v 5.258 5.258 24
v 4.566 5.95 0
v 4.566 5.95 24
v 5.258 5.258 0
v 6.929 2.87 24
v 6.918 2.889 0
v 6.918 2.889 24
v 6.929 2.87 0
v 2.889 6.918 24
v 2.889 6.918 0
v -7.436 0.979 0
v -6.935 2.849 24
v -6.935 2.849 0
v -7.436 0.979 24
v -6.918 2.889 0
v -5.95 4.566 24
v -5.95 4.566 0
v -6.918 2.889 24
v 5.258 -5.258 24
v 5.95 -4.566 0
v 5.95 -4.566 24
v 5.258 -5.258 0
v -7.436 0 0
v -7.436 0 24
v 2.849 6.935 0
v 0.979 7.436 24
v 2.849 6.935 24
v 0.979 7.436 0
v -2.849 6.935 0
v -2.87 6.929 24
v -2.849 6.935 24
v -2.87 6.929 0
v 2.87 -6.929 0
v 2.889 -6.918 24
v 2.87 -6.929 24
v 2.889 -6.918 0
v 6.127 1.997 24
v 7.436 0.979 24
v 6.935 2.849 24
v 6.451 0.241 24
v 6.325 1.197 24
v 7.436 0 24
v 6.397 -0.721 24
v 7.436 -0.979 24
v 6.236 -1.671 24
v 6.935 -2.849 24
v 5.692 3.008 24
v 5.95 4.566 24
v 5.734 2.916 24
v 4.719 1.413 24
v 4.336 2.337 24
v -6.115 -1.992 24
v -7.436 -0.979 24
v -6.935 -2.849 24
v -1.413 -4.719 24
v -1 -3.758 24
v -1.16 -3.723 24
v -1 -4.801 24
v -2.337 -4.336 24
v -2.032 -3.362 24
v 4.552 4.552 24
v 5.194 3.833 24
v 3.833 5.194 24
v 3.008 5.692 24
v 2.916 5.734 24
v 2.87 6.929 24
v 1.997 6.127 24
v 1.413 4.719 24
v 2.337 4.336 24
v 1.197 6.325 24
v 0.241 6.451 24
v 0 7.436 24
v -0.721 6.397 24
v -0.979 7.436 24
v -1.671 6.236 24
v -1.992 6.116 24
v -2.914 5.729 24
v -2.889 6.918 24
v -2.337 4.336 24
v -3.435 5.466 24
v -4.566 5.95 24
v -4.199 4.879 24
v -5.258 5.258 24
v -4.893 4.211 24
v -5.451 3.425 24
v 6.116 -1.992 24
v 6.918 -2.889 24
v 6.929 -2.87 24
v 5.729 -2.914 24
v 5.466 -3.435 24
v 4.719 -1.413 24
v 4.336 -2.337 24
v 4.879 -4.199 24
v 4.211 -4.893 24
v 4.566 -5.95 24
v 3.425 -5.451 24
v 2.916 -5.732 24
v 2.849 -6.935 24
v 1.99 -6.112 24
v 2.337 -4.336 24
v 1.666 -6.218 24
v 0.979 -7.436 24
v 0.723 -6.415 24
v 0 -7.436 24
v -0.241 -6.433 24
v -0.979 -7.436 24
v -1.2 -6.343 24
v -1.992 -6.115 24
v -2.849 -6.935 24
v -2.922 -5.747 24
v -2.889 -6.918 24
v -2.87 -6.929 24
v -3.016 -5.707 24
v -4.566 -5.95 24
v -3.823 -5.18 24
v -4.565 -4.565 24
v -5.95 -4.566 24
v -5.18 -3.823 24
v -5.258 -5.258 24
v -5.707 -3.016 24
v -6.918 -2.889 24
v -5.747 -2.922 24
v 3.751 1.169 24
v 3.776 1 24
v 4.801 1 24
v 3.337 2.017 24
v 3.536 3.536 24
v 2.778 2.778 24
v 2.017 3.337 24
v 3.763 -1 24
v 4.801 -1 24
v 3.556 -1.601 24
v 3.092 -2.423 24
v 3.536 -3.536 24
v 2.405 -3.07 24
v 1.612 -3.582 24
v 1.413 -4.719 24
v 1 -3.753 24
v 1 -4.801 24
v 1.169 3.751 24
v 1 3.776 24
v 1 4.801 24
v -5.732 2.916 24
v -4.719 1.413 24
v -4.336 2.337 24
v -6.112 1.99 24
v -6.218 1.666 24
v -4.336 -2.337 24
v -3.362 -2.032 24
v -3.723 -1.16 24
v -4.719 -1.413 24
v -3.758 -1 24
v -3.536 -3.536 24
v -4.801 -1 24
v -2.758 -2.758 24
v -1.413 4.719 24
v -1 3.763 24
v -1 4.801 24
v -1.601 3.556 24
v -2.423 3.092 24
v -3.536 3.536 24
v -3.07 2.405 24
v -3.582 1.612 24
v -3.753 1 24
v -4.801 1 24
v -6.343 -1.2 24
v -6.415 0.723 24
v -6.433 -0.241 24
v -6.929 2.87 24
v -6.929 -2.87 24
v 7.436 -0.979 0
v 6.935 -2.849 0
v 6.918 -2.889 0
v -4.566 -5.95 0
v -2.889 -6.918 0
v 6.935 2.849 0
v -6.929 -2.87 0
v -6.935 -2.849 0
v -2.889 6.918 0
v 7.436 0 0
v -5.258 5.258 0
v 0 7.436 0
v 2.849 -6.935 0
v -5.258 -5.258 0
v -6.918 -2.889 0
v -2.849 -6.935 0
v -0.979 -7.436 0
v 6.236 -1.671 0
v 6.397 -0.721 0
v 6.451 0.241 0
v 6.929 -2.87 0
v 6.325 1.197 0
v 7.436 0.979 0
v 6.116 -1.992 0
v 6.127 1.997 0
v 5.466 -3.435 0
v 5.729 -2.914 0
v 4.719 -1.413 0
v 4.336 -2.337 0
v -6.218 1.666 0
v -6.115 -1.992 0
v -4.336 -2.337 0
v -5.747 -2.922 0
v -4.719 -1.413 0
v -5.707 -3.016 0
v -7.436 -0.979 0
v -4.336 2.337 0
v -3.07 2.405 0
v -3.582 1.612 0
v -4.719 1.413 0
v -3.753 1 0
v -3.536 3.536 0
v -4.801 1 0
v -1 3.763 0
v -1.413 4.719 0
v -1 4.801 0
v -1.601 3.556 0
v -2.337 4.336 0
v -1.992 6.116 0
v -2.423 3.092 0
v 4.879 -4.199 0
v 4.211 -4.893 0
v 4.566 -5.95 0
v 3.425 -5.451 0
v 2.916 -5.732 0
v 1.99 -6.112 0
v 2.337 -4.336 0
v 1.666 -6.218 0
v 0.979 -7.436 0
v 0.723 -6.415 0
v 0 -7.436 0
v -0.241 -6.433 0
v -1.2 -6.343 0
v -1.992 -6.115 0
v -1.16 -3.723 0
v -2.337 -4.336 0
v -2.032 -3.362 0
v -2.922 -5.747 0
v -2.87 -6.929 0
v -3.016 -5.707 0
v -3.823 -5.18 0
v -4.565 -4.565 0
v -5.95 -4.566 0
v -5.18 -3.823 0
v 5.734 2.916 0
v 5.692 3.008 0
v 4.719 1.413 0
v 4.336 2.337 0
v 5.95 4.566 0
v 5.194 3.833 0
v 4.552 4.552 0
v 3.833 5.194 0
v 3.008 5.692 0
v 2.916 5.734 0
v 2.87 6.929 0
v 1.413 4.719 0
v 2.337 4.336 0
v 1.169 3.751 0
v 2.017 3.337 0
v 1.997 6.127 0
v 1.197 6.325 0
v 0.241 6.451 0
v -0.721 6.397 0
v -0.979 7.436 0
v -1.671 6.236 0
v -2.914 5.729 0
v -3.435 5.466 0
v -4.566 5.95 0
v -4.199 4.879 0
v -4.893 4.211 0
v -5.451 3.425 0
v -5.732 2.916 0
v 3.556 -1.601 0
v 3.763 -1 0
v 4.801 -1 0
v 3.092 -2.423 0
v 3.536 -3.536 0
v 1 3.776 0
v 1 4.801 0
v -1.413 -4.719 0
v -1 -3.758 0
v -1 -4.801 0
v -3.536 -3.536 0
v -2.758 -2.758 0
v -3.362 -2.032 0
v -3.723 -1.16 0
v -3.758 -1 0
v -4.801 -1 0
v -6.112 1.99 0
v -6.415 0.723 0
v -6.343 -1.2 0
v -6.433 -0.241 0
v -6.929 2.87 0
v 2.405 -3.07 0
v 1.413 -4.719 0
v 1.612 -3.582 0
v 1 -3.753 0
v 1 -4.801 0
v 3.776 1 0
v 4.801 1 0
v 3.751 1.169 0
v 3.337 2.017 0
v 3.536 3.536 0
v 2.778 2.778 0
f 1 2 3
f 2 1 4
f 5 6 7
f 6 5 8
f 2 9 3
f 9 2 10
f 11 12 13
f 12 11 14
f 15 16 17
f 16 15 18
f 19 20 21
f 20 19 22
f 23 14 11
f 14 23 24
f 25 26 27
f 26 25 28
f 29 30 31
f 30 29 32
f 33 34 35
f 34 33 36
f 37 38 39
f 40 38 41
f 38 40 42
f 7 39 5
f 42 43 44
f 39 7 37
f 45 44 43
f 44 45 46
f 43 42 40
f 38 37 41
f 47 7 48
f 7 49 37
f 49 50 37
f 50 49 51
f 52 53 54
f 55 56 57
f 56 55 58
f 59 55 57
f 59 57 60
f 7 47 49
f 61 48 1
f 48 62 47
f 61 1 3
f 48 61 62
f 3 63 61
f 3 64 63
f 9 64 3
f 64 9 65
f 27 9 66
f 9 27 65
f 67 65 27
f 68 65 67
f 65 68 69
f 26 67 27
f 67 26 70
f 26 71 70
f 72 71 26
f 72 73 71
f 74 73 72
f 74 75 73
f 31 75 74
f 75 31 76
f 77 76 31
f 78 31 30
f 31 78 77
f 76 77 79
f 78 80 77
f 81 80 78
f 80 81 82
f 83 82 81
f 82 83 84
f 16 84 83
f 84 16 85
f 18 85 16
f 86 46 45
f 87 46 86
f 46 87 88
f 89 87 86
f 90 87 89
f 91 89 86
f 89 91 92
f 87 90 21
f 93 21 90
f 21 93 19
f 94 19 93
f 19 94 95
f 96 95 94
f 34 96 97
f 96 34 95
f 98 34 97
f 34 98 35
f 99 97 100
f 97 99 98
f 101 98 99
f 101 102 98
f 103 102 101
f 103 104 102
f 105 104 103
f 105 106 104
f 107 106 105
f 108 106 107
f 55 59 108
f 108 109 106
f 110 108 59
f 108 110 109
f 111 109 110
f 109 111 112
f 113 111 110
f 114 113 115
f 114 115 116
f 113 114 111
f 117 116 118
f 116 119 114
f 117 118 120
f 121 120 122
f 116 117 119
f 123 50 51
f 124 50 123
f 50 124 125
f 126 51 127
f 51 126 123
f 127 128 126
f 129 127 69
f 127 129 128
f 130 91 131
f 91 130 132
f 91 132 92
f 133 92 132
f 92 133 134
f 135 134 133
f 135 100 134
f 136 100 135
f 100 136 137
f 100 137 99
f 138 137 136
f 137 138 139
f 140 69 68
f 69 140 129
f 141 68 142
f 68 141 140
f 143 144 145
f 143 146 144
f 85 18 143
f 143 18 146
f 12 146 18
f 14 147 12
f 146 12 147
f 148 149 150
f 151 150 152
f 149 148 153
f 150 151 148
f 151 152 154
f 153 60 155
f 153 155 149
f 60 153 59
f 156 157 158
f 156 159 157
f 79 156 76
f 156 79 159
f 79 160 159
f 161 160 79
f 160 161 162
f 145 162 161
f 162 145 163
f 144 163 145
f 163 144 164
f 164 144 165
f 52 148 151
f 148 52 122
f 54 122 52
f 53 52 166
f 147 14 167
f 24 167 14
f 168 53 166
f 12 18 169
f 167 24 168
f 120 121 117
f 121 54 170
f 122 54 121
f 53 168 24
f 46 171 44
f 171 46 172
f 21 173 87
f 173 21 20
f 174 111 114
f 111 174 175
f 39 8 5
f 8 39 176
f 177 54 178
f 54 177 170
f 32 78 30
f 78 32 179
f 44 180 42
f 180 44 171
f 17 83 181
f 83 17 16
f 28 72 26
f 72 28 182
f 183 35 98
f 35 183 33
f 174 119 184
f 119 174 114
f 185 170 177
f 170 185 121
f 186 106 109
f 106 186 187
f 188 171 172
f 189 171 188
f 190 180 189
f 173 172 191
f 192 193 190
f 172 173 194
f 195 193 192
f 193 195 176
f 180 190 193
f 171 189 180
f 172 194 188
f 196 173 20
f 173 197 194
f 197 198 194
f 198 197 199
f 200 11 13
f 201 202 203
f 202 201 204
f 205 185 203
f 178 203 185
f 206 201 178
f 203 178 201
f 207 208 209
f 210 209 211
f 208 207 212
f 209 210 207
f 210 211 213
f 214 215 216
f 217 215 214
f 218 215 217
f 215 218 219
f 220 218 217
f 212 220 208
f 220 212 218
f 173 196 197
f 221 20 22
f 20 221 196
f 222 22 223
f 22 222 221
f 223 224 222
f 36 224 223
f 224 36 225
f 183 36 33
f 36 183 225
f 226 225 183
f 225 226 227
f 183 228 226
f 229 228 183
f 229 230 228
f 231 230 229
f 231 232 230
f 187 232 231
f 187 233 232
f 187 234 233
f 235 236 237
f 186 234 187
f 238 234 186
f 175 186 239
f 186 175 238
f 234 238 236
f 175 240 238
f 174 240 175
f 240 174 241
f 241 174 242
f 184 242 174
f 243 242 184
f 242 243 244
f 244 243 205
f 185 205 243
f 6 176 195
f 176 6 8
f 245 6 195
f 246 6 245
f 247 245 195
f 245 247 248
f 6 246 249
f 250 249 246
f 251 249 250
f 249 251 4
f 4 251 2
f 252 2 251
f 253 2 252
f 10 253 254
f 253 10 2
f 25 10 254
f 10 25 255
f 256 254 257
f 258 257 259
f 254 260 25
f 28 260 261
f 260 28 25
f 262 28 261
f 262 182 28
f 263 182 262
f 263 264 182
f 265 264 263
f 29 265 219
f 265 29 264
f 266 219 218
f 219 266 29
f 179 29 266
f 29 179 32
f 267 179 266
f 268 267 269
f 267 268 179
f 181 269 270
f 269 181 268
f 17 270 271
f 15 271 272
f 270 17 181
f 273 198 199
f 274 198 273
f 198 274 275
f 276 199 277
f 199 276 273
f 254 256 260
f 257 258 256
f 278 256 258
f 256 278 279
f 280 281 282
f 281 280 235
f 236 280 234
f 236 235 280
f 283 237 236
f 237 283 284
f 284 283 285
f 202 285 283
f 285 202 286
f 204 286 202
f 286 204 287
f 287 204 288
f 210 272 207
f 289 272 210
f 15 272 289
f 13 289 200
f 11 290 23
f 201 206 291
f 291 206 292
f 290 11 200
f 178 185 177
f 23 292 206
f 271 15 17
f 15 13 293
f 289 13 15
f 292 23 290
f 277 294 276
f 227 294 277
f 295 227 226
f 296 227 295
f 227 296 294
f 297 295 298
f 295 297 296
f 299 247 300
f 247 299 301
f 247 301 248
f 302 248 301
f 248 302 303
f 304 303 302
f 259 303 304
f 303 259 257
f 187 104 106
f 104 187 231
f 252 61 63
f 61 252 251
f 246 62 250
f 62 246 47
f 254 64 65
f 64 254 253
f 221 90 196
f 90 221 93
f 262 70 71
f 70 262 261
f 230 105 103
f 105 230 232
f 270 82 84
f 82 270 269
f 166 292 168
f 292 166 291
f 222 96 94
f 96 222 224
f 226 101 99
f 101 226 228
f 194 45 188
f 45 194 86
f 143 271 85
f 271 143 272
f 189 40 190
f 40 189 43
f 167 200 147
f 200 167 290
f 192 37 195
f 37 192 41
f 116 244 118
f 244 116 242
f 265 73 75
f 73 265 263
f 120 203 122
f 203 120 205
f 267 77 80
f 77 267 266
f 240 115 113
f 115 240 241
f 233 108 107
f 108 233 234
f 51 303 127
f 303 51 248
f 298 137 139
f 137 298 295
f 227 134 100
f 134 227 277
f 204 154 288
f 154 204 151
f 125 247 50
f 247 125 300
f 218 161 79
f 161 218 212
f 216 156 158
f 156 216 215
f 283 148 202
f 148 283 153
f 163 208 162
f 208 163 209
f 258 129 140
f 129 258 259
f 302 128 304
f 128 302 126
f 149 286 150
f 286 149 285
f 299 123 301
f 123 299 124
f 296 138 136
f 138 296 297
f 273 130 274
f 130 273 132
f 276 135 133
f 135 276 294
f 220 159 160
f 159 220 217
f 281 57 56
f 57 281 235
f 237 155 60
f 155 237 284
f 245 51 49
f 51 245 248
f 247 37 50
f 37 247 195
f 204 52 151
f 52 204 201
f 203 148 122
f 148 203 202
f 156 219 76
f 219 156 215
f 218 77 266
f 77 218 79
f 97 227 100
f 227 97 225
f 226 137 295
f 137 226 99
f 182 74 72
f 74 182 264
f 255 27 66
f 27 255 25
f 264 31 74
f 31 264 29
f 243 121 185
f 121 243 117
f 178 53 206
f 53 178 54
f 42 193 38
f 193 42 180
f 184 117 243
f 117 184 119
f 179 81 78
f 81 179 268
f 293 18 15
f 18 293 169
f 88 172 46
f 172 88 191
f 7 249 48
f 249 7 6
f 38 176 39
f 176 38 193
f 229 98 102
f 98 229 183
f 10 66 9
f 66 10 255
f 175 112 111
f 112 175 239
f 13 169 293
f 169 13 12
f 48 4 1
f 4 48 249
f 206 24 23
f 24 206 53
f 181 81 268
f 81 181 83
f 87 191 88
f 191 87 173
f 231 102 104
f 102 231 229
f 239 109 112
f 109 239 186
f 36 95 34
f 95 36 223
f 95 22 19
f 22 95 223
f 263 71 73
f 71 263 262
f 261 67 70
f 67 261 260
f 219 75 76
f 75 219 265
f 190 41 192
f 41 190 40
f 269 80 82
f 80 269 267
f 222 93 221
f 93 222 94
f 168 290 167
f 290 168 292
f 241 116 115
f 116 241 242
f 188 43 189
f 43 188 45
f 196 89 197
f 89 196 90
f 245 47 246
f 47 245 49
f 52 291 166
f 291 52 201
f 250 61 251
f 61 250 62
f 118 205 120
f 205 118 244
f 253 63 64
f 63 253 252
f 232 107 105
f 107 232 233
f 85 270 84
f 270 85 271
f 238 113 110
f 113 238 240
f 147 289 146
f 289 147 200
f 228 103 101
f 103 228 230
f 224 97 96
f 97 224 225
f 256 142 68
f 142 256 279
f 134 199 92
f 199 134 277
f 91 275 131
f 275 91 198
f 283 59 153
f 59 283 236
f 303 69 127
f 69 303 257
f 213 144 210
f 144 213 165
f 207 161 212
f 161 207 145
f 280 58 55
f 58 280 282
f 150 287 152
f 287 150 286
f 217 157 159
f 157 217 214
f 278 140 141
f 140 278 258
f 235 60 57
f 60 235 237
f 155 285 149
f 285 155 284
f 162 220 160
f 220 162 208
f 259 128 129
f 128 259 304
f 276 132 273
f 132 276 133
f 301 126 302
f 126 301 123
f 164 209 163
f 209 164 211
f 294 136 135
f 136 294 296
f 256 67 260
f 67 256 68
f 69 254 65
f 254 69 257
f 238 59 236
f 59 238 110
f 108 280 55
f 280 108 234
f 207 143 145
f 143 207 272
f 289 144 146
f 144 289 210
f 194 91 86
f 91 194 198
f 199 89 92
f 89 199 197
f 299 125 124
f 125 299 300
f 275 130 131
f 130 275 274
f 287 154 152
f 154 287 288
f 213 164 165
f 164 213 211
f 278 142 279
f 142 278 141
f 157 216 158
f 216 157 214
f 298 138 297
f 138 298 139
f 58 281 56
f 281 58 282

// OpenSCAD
/*[Standard settings]*/
//Specify the height of the bearing
// use 14mm for FFCP Bearings 
// use 24mm for LM8UU and 45mm for LM8UUL
Height = 24 ; // [10:1:100]
//Specify the outside diameter of the bearing
Outside_Diameter = 15 ; // [15:1:50]
//Specify the inner diameter of the bearing
Inner_Diameter = 8 ; // [6:2:12]
// Specify the shell thickness
Thickness = 2 ; // [1.5:0.25:3]
// Specify inner tolerance needed for specific printers
Tolerance = 0.00 ; // [0:0.05:2]

/*[Design]*/
// Close bearing on bottom and top ?
ClosedDesign = "No" ; // [Yes,No]

/*[Securing]*/
// Thickness for inserting secure rings ?
SecureRing_Thickness = 0; // [0:0.50:1.5]
// Space between bottom and top for inserting rings ?
SecureRing_Height = 2.75; // [2.5:0.25:10]

difference () {
    union () {
        translate ([0,0,0]) rotate ([0,0,22.5]) LMXUU();
        translate ([0,0,0]) rotate ([0,0,67.5]) LMXUU();
    }
    translate ([0,0,0]) rotate ([0,0,0]) LMXUU_Dif();

}

module LMXUU () {
    color ("blue") 
    difference () {
        union () {
            difference () {
                cylinder (d=Outside_Diameter,h=Height);
                translate ([0,0,Thickness/2]) cylinder (d=Outside_Diameter-Thickness+Tolerance,h=Height-Thickness);
                translate ([0,0,-0.5]) cylinder (d=Inner_Diameter+Tolerance,h=Height+1);

                if (ClosedDesign == "No") {
                    translate ([0,0,-Thickness/2]) cylinder (d=Outside_Diameter-Thickness+Tolerance,h=Height+Thickness);
                }

            }
            difference () {
                cylinder (d=Inner_Diameter+Thickness+Tolerance,h=Height);
                translate ([0,0,-0.5]) cylinder (d=Inner_Diameter+Tolerance,h=Height+1);

            }
            translate ([0,-Thickness/4,0]) cube ([Outside_Diameter/2-Thickness/4,Thickness/2,Height]);
            translate ([0,-Thickness/4,0]) mirror ([1,0,0]) cube ([Outside_Diameter/2-Thickness/4,Thickness/2,Height]);
            translate ([-Thickness/4,0,0]) cube ([Thickness/2,Outside_Diameter/2-Thickness/4,Height]);
            translate ([-Thickness/4,0,0]) mirror ([0,1,0]) cube ([Thickness/2,Outside_Diameter/2-Thickness/4,Height]);
        }
    
        translate ([0,0,-0.5]) cylinder (d=Inner_Diameter+Tolerance,h=Height+1);
            difference () {
                translate ([0,0,SecureRing_Height]) cylinder (d=Outside_Diameter+1,h=SecureRing_Thickness);
                translate ([0,0,SecureRing_Height]) cylinder (d=Outside_Diameter-0.75,h=SecureRing_Thickness);
            }
            difference () {
                translate ([0,0,Height-SecureRing_Height-SecureRing_Thickness]) cylinder (d=Outside_Diameter+1,h=SecureRing_Thickness);
                translate ([0,0,Height-SecureRing_Height-SecureRing_Thickness]) cylinder (d=Outside_Diameter-0.65,h=SecureRing_Thickness);
        }
    }
}

module LMXUU_Dif () {
    color ("Blue") 
    union () {
        translate ([0,-Thickness/2,-0.5]) cube ([Outside_Diameter/2-Thickness/2-0.25,Thickness,Height+1]);
        translate ([0,-Thickness/2,-0.5]) mirror ([1,0,0]) cube ([Outside_Diameter/2-Thickness/2-0.25,Thickness,Height+1]);
        translate ([-Thickness/2,0,-0.5]) cube ([Thickness,Outside_Diameter/2-Thickness/2-0.25,Height+1]);
        translate ([-Thickness/2,0,-0.5]) mirror ([0,1,0]) cube ([Thickness,Outside_Diameter/2-Thickness/2-0.25,Height+1]);
    }
}
